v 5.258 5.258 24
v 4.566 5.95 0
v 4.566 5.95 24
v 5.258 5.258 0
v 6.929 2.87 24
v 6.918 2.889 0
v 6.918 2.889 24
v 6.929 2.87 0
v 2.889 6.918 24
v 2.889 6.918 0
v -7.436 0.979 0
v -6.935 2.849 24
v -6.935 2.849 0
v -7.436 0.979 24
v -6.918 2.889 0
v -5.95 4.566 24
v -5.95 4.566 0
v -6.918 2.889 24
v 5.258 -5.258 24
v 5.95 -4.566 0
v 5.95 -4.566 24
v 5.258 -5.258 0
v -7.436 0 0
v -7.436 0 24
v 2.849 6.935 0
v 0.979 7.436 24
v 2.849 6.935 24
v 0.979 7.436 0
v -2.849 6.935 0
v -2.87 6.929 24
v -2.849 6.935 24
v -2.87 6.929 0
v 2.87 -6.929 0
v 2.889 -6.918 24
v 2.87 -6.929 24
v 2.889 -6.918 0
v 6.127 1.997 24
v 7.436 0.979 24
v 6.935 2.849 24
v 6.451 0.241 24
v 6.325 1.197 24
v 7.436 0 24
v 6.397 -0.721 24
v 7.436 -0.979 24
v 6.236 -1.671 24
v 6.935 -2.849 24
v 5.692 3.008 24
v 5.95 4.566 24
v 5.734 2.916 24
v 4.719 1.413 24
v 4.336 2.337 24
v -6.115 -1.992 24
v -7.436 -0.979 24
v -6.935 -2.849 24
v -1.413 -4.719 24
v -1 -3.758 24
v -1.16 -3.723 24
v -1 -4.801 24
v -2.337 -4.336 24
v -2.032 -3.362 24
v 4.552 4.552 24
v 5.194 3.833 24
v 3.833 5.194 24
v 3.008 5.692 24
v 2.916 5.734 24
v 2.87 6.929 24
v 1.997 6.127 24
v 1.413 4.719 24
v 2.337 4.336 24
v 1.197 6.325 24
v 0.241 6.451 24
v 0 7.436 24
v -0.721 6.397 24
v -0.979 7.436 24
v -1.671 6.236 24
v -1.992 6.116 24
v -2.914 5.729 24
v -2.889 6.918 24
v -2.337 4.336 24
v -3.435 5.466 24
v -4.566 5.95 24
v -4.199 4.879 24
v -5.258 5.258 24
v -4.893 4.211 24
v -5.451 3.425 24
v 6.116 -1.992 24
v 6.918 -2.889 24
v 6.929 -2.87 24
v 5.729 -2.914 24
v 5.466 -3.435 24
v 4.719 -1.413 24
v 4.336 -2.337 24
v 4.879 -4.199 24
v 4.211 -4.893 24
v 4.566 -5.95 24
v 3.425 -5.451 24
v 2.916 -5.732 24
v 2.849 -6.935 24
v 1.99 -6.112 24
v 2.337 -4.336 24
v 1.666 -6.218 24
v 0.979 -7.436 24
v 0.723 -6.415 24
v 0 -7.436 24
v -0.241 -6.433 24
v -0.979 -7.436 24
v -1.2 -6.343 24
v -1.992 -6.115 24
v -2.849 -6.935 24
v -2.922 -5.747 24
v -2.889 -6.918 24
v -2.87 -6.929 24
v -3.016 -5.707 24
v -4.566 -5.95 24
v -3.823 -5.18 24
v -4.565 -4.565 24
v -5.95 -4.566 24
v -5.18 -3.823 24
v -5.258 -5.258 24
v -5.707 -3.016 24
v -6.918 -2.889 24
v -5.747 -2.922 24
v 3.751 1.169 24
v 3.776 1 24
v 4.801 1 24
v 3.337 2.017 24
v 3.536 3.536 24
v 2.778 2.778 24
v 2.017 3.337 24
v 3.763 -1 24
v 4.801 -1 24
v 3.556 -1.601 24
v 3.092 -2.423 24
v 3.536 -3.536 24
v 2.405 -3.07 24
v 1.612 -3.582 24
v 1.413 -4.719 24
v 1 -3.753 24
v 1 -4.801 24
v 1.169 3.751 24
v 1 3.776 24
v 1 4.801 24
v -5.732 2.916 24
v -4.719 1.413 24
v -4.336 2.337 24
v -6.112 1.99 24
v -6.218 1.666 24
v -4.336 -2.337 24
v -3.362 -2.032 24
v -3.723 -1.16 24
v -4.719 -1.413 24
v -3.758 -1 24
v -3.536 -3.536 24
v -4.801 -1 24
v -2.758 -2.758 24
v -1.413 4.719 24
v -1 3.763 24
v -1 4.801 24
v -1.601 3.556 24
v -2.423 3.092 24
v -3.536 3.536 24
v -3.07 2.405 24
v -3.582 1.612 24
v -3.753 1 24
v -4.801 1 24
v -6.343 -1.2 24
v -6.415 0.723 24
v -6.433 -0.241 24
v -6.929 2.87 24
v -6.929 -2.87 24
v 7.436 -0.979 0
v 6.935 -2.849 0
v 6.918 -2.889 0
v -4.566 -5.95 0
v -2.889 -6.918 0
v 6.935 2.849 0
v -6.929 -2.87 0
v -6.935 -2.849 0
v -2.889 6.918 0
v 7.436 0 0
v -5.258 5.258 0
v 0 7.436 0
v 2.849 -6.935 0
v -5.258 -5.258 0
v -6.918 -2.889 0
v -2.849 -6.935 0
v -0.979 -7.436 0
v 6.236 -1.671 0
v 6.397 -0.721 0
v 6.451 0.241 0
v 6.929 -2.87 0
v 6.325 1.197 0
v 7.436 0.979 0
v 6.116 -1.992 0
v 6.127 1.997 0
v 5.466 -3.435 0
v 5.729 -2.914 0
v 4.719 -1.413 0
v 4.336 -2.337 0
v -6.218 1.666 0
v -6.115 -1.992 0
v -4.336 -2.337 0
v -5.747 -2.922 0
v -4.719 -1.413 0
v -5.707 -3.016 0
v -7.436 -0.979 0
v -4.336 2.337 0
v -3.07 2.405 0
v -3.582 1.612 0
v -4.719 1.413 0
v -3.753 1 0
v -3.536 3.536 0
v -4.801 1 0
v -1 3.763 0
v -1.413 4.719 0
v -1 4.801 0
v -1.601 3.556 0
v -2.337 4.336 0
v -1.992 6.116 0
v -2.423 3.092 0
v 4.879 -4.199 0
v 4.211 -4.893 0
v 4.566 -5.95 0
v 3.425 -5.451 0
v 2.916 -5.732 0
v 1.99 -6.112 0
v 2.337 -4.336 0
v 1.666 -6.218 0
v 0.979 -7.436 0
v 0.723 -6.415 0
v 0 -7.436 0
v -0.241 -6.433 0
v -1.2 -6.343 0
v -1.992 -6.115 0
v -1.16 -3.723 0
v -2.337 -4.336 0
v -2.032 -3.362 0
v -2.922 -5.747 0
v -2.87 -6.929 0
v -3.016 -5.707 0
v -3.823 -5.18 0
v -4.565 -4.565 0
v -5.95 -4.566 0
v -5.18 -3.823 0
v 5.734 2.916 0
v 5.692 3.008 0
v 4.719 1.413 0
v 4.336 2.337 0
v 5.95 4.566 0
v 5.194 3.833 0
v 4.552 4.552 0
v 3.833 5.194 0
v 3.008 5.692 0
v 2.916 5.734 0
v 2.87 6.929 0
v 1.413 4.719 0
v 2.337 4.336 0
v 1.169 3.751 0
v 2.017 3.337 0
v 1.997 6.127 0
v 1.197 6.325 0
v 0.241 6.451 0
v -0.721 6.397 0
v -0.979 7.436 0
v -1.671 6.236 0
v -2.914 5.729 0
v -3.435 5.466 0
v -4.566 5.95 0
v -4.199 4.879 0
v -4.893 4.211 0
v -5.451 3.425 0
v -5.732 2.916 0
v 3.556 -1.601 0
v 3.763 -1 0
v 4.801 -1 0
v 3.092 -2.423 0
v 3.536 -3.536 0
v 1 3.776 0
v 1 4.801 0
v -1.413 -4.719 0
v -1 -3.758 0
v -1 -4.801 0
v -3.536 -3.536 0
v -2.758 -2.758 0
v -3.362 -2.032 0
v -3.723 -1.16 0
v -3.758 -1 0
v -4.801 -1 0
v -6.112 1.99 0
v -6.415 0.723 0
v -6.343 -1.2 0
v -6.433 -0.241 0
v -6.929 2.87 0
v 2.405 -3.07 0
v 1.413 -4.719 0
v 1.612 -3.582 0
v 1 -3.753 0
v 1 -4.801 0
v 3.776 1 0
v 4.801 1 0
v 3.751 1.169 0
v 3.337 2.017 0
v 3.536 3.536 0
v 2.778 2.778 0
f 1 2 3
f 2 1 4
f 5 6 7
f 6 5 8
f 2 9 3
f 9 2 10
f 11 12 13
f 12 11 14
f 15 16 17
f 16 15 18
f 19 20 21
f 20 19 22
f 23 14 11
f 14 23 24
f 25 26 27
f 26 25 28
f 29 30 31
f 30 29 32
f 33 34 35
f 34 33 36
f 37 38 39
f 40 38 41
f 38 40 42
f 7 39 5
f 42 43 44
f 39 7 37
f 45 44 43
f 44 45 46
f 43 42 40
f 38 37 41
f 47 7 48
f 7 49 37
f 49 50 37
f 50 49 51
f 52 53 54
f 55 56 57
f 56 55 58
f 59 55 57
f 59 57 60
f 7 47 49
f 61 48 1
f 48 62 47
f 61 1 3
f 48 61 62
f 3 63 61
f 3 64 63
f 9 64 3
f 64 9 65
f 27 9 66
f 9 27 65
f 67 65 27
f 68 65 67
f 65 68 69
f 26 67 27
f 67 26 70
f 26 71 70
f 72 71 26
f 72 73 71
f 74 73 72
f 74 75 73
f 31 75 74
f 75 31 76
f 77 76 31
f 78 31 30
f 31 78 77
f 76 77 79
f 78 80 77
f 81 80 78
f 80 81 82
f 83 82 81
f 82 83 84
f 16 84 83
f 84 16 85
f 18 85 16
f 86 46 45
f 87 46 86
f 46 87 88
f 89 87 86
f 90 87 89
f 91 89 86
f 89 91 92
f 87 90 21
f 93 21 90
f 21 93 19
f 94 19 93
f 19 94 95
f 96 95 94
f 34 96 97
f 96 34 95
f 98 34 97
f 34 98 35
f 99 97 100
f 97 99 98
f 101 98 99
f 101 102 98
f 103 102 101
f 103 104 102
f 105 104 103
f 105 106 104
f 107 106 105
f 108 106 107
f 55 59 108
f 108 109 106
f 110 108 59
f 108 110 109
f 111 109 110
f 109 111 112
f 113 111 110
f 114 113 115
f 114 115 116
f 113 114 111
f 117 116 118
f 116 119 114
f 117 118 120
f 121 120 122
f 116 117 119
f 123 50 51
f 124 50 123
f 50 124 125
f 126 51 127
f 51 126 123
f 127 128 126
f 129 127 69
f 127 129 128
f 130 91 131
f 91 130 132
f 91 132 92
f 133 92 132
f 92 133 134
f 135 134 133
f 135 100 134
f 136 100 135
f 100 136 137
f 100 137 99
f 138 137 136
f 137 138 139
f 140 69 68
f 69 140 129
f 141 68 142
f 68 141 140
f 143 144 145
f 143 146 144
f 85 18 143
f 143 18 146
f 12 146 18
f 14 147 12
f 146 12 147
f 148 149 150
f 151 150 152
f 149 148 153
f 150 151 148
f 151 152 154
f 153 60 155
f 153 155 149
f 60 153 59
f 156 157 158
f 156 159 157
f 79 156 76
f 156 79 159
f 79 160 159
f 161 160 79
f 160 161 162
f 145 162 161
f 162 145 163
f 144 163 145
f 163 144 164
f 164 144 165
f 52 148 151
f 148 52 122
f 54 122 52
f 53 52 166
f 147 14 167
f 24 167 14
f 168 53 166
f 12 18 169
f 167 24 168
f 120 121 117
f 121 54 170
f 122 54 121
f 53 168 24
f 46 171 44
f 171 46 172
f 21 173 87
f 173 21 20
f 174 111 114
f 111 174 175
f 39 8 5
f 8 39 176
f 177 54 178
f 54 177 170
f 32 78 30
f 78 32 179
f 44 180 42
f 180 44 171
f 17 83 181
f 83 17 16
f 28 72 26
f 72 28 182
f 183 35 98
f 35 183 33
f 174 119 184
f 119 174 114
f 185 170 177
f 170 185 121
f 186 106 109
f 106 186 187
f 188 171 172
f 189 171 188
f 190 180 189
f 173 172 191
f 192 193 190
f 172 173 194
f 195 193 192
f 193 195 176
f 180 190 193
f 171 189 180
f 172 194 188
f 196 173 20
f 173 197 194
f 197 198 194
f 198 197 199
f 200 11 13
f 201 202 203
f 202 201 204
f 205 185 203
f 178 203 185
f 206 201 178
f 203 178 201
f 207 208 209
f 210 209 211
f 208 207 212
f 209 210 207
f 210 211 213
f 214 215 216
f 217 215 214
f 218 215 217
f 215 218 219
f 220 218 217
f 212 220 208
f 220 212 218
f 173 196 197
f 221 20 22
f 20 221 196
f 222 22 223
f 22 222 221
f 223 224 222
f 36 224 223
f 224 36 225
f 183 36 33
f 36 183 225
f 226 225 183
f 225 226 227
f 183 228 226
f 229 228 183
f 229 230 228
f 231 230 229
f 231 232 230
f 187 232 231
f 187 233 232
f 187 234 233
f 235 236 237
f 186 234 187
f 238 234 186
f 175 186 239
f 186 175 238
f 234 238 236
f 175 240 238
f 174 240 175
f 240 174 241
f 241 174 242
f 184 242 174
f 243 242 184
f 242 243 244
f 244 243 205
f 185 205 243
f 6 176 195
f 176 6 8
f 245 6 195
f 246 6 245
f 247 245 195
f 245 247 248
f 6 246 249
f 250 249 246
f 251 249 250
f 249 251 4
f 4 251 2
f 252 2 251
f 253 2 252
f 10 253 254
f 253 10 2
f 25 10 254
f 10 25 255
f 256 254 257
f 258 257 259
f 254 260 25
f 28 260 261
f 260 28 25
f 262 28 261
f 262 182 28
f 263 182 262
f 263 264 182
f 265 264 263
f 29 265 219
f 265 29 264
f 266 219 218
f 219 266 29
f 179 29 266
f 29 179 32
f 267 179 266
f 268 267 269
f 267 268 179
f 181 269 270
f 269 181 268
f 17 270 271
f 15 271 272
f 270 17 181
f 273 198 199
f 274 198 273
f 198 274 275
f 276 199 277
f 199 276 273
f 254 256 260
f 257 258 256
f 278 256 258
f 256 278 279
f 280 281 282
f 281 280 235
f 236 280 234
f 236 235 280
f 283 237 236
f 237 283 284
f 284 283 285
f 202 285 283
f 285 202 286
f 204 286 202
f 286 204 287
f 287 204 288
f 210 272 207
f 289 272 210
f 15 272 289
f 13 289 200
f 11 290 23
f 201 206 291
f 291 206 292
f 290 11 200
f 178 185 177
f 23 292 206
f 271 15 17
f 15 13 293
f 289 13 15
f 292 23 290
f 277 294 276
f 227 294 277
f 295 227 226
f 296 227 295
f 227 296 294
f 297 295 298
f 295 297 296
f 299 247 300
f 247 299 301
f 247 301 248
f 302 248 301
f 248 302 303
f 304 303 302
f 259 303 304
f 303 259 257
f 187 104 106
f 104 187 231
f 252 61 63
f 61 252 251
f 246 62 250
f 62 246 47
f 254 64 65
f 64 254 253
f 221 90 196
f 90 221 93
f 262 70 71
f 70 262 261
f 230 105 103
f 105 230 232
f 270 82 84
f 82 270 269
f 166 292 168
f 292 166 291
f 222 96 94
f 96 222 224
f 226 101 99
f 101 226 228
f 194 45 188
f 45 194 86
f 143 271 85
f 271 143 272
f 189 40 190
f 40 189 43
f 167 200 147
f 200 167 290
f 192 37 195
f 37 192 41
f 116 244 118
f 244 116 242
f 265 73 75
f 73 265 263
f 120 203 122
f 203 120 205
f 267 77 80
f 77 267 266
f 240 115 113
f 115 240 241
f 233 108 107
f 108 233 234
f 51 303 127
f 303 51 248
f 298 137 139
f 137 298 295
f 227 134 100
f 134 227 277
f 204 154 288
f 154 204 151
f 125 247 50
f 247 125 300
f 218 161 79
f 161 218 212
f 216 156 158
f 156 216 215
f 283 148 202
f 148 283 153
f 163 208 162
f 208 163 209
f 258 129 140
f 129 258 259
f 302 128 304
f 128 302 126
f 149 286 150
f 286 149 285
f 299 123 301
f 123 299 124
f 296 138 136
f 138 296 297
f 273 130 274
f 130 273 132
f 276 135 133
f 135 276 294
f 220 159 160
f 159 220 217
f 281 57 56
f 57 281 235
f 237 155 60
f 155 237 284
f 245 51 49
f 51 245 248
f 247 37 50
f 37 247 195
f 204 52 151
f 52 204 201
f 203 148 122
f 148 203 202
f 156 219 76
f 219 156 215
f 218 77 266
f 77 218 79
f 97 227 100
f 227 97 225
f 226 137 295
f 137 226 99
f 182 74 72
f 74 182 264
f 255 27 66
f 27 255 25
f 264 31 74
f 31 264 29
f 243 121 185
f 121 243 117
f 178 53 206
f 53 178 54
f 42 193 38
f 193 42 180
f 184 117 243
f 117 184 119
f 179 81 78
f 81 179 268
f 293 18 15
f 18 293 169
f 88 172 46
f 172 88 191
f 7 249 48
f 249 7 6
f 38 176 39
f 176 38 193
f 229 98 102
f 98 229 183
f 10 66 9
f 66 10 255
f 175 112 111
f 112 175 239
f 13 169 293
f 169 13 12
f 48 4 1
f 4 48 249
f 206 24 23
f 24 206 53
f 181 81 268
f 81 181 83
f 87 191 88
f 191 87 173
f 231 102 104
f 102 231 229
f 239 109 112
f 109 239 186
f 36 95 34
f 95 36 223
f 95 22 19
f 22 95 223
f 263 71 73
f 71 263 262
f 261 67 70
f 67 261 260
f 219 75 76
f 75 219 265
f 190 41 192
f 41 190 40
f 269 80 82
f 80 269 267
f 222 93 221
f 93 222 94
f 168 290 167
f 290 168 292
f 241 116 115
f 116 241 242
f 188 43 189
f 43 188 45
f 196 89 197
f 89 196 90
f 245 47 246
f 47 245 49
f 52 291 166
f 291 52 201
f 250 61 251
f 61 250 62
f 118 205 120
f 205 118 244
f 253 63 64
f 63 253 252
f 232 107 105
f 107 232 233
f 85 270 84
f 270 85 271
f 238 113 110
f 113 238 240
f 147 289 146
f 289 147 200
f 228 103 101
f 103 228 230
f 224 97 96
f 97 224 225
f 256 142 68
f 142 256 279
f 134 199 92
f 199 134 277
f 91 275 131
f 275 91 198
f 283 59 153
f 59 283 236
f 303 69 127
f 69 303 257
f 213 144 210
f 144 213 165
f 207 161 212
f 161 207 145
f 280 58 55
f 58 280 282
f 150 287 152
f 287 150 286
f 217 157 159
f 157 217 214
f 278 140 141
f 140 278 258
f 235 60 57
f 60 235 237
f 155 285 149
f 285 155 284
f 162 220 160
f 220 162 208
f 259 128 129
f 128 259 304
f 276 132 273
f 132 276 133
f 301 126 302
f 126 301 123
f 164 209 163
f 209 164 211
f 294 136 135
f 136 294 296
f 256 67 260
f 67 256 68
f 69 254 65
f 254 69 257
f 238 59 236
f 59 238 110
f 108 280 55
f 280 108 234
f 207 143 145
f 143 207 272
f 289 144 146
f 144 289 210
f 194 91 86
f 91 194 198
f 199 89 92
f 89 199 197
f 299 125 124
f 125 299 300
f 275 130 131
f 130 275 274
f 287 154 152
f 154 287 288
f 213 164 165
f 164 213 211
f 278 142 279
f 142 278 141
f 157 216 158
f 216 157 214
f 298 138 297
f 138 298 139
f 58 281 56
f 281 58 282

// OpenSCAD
/*[Standard settings]*/
//Specify the height of the bearing
// use 14mm for FFCP Bearings 
// use 24mm for LM8UU and 45mm for LM8UUL
Height = 24 ; // [10:1:100]
//Specify the outside diameter of the bearing
Outside_Diameter = 15 ; // [15:1:50]
//Specify the inner diameter of the bearing
Inner_Diameter = 8 ; // [6:2:12]
// Specify the shell thickness
Thickness = 2 ; // [1.5:0.25:3]
// Specify inner tolerance needed for specific printers
Tolerance = 0.00 ; // [0:0.05:2]

/*[Design]*/
// Close bearing on bottom and top ?
ClosedDesign = "No" ; // [Yes,No]

/*[Securing]*/
// Thickness for inserting secure rings ?
SecureRing_Thickness = 0; // [0:0.50:1.5]
// Space between bottom and top for inserting rings ?
SecureRing_Height = 2.75; // [2.5:0.25:10]

difference () {
    union () {
        translate ([0,0,0]) rotate ([0,0,22.5]) LMXUU();
        translate ([0,0,0]) rotate ([0,0,67.5]) LMXUU();
    }
    translate ([0,0,0]) rotate ([0,0,0]) LMXUU_Dif();

}

module LMXUU () {
    color ("blue") 
    difference () {
        union () {
            difference () {
                cylinder (d=Outside_Diameter,h=Height);
                translate ([0,0,Thickness/2]) cylinder (d=Outside_Diameter-Thickness+Tolerance,h=Height-Thickness);
                translate ([0,0,-0.5]) cylinder (d=Inner_Diameter+Tolerance,h=Height+1);

                if (ClosedDesign == "No") {
                    translate ([0,0,-Thickness/2]) cylinder (d=Outside_Diameter-Thickness+Tolerance,h=Height+Thickness);
                }

            }
            difference () {
                cylinder (d=Inner_Diameter+Thickness+Tolerance,h=Height);
                translate ([0,0,-0.5]) cylinder (d=Inner_Diameter+Tolerance,h=Height+1);

            }
            translate ([0,-Thickness/4,0]) cube ([Outside_Diameter/2-Thickness/4,Thickness/2,Height]);
            translate ([0,-Thickness/4,0]) mirror ([1,0,0]) cube ([Outside_Diameter/2-Thickness/4,Thickness/2,Height]);
            translate ([-Thickness/4,0,0]) cube ([Thickness/2,Outside_Diameter/2-Thickness/4,Height]);
            translate ([-Thickness/4,0,0]) mirror ([0,1,0]) cube ([Thickness/2,Outside_Diameter/2-Thickness/4,Height]);
        }
    
        translate ([0,0,-0.5]) cylinder (d=Inner_Diameter+Tolerance,h=Height+1);
            difference () {
                translate ([0,0,SecureRing_Height]) cylinder (d=Outside_Diameter+1,h=SecureRing_Thickness);
                translate ([0,0,SecureRing_Height]) cylinder (d=Outside_Diameter-0.75,h=SecureRing_Thickness);
            }
            difference () {
                translate ([0,0,Height-SecureRing_Height-SecureRing_Thickness]) cylinder (d=Outside_Diameter+1,h=SecureRing_Thickness);
                translate ([0,0,Height-SecureRing_Height-SecureRing_Thickness]) cylinder (d=Outside_Diameter-0.65,h=SecureRing_Thickness);
        }
    }
}

module LMXUU_Dif () {
    color ("Blue") 
    union () {
        translate ([0,-Thickness/2,-0.5]) cube ([Outside_Diameter/2-Thickness/2-0.25,Thickness,Height+1]);
        translate ([0,-Thickness/2,-0.5]) mirror ([1,0,0]) cube ([Outside_Diameter/2-Thickness/2-0.25,Thickness,Height+1]);
        translate ([-Thickness/2,0,-0.5]) cube ([Thickness,Outside_Diameter/2-Thickness/2-0.25,Height+1]);
        translate ([-Thickness/2,0,-0.5]) mirror ([0,1,0]) cube ([Thickness,Outside_Diameter/2-Thickness/2-0.25,Height+1]);
    }
}
